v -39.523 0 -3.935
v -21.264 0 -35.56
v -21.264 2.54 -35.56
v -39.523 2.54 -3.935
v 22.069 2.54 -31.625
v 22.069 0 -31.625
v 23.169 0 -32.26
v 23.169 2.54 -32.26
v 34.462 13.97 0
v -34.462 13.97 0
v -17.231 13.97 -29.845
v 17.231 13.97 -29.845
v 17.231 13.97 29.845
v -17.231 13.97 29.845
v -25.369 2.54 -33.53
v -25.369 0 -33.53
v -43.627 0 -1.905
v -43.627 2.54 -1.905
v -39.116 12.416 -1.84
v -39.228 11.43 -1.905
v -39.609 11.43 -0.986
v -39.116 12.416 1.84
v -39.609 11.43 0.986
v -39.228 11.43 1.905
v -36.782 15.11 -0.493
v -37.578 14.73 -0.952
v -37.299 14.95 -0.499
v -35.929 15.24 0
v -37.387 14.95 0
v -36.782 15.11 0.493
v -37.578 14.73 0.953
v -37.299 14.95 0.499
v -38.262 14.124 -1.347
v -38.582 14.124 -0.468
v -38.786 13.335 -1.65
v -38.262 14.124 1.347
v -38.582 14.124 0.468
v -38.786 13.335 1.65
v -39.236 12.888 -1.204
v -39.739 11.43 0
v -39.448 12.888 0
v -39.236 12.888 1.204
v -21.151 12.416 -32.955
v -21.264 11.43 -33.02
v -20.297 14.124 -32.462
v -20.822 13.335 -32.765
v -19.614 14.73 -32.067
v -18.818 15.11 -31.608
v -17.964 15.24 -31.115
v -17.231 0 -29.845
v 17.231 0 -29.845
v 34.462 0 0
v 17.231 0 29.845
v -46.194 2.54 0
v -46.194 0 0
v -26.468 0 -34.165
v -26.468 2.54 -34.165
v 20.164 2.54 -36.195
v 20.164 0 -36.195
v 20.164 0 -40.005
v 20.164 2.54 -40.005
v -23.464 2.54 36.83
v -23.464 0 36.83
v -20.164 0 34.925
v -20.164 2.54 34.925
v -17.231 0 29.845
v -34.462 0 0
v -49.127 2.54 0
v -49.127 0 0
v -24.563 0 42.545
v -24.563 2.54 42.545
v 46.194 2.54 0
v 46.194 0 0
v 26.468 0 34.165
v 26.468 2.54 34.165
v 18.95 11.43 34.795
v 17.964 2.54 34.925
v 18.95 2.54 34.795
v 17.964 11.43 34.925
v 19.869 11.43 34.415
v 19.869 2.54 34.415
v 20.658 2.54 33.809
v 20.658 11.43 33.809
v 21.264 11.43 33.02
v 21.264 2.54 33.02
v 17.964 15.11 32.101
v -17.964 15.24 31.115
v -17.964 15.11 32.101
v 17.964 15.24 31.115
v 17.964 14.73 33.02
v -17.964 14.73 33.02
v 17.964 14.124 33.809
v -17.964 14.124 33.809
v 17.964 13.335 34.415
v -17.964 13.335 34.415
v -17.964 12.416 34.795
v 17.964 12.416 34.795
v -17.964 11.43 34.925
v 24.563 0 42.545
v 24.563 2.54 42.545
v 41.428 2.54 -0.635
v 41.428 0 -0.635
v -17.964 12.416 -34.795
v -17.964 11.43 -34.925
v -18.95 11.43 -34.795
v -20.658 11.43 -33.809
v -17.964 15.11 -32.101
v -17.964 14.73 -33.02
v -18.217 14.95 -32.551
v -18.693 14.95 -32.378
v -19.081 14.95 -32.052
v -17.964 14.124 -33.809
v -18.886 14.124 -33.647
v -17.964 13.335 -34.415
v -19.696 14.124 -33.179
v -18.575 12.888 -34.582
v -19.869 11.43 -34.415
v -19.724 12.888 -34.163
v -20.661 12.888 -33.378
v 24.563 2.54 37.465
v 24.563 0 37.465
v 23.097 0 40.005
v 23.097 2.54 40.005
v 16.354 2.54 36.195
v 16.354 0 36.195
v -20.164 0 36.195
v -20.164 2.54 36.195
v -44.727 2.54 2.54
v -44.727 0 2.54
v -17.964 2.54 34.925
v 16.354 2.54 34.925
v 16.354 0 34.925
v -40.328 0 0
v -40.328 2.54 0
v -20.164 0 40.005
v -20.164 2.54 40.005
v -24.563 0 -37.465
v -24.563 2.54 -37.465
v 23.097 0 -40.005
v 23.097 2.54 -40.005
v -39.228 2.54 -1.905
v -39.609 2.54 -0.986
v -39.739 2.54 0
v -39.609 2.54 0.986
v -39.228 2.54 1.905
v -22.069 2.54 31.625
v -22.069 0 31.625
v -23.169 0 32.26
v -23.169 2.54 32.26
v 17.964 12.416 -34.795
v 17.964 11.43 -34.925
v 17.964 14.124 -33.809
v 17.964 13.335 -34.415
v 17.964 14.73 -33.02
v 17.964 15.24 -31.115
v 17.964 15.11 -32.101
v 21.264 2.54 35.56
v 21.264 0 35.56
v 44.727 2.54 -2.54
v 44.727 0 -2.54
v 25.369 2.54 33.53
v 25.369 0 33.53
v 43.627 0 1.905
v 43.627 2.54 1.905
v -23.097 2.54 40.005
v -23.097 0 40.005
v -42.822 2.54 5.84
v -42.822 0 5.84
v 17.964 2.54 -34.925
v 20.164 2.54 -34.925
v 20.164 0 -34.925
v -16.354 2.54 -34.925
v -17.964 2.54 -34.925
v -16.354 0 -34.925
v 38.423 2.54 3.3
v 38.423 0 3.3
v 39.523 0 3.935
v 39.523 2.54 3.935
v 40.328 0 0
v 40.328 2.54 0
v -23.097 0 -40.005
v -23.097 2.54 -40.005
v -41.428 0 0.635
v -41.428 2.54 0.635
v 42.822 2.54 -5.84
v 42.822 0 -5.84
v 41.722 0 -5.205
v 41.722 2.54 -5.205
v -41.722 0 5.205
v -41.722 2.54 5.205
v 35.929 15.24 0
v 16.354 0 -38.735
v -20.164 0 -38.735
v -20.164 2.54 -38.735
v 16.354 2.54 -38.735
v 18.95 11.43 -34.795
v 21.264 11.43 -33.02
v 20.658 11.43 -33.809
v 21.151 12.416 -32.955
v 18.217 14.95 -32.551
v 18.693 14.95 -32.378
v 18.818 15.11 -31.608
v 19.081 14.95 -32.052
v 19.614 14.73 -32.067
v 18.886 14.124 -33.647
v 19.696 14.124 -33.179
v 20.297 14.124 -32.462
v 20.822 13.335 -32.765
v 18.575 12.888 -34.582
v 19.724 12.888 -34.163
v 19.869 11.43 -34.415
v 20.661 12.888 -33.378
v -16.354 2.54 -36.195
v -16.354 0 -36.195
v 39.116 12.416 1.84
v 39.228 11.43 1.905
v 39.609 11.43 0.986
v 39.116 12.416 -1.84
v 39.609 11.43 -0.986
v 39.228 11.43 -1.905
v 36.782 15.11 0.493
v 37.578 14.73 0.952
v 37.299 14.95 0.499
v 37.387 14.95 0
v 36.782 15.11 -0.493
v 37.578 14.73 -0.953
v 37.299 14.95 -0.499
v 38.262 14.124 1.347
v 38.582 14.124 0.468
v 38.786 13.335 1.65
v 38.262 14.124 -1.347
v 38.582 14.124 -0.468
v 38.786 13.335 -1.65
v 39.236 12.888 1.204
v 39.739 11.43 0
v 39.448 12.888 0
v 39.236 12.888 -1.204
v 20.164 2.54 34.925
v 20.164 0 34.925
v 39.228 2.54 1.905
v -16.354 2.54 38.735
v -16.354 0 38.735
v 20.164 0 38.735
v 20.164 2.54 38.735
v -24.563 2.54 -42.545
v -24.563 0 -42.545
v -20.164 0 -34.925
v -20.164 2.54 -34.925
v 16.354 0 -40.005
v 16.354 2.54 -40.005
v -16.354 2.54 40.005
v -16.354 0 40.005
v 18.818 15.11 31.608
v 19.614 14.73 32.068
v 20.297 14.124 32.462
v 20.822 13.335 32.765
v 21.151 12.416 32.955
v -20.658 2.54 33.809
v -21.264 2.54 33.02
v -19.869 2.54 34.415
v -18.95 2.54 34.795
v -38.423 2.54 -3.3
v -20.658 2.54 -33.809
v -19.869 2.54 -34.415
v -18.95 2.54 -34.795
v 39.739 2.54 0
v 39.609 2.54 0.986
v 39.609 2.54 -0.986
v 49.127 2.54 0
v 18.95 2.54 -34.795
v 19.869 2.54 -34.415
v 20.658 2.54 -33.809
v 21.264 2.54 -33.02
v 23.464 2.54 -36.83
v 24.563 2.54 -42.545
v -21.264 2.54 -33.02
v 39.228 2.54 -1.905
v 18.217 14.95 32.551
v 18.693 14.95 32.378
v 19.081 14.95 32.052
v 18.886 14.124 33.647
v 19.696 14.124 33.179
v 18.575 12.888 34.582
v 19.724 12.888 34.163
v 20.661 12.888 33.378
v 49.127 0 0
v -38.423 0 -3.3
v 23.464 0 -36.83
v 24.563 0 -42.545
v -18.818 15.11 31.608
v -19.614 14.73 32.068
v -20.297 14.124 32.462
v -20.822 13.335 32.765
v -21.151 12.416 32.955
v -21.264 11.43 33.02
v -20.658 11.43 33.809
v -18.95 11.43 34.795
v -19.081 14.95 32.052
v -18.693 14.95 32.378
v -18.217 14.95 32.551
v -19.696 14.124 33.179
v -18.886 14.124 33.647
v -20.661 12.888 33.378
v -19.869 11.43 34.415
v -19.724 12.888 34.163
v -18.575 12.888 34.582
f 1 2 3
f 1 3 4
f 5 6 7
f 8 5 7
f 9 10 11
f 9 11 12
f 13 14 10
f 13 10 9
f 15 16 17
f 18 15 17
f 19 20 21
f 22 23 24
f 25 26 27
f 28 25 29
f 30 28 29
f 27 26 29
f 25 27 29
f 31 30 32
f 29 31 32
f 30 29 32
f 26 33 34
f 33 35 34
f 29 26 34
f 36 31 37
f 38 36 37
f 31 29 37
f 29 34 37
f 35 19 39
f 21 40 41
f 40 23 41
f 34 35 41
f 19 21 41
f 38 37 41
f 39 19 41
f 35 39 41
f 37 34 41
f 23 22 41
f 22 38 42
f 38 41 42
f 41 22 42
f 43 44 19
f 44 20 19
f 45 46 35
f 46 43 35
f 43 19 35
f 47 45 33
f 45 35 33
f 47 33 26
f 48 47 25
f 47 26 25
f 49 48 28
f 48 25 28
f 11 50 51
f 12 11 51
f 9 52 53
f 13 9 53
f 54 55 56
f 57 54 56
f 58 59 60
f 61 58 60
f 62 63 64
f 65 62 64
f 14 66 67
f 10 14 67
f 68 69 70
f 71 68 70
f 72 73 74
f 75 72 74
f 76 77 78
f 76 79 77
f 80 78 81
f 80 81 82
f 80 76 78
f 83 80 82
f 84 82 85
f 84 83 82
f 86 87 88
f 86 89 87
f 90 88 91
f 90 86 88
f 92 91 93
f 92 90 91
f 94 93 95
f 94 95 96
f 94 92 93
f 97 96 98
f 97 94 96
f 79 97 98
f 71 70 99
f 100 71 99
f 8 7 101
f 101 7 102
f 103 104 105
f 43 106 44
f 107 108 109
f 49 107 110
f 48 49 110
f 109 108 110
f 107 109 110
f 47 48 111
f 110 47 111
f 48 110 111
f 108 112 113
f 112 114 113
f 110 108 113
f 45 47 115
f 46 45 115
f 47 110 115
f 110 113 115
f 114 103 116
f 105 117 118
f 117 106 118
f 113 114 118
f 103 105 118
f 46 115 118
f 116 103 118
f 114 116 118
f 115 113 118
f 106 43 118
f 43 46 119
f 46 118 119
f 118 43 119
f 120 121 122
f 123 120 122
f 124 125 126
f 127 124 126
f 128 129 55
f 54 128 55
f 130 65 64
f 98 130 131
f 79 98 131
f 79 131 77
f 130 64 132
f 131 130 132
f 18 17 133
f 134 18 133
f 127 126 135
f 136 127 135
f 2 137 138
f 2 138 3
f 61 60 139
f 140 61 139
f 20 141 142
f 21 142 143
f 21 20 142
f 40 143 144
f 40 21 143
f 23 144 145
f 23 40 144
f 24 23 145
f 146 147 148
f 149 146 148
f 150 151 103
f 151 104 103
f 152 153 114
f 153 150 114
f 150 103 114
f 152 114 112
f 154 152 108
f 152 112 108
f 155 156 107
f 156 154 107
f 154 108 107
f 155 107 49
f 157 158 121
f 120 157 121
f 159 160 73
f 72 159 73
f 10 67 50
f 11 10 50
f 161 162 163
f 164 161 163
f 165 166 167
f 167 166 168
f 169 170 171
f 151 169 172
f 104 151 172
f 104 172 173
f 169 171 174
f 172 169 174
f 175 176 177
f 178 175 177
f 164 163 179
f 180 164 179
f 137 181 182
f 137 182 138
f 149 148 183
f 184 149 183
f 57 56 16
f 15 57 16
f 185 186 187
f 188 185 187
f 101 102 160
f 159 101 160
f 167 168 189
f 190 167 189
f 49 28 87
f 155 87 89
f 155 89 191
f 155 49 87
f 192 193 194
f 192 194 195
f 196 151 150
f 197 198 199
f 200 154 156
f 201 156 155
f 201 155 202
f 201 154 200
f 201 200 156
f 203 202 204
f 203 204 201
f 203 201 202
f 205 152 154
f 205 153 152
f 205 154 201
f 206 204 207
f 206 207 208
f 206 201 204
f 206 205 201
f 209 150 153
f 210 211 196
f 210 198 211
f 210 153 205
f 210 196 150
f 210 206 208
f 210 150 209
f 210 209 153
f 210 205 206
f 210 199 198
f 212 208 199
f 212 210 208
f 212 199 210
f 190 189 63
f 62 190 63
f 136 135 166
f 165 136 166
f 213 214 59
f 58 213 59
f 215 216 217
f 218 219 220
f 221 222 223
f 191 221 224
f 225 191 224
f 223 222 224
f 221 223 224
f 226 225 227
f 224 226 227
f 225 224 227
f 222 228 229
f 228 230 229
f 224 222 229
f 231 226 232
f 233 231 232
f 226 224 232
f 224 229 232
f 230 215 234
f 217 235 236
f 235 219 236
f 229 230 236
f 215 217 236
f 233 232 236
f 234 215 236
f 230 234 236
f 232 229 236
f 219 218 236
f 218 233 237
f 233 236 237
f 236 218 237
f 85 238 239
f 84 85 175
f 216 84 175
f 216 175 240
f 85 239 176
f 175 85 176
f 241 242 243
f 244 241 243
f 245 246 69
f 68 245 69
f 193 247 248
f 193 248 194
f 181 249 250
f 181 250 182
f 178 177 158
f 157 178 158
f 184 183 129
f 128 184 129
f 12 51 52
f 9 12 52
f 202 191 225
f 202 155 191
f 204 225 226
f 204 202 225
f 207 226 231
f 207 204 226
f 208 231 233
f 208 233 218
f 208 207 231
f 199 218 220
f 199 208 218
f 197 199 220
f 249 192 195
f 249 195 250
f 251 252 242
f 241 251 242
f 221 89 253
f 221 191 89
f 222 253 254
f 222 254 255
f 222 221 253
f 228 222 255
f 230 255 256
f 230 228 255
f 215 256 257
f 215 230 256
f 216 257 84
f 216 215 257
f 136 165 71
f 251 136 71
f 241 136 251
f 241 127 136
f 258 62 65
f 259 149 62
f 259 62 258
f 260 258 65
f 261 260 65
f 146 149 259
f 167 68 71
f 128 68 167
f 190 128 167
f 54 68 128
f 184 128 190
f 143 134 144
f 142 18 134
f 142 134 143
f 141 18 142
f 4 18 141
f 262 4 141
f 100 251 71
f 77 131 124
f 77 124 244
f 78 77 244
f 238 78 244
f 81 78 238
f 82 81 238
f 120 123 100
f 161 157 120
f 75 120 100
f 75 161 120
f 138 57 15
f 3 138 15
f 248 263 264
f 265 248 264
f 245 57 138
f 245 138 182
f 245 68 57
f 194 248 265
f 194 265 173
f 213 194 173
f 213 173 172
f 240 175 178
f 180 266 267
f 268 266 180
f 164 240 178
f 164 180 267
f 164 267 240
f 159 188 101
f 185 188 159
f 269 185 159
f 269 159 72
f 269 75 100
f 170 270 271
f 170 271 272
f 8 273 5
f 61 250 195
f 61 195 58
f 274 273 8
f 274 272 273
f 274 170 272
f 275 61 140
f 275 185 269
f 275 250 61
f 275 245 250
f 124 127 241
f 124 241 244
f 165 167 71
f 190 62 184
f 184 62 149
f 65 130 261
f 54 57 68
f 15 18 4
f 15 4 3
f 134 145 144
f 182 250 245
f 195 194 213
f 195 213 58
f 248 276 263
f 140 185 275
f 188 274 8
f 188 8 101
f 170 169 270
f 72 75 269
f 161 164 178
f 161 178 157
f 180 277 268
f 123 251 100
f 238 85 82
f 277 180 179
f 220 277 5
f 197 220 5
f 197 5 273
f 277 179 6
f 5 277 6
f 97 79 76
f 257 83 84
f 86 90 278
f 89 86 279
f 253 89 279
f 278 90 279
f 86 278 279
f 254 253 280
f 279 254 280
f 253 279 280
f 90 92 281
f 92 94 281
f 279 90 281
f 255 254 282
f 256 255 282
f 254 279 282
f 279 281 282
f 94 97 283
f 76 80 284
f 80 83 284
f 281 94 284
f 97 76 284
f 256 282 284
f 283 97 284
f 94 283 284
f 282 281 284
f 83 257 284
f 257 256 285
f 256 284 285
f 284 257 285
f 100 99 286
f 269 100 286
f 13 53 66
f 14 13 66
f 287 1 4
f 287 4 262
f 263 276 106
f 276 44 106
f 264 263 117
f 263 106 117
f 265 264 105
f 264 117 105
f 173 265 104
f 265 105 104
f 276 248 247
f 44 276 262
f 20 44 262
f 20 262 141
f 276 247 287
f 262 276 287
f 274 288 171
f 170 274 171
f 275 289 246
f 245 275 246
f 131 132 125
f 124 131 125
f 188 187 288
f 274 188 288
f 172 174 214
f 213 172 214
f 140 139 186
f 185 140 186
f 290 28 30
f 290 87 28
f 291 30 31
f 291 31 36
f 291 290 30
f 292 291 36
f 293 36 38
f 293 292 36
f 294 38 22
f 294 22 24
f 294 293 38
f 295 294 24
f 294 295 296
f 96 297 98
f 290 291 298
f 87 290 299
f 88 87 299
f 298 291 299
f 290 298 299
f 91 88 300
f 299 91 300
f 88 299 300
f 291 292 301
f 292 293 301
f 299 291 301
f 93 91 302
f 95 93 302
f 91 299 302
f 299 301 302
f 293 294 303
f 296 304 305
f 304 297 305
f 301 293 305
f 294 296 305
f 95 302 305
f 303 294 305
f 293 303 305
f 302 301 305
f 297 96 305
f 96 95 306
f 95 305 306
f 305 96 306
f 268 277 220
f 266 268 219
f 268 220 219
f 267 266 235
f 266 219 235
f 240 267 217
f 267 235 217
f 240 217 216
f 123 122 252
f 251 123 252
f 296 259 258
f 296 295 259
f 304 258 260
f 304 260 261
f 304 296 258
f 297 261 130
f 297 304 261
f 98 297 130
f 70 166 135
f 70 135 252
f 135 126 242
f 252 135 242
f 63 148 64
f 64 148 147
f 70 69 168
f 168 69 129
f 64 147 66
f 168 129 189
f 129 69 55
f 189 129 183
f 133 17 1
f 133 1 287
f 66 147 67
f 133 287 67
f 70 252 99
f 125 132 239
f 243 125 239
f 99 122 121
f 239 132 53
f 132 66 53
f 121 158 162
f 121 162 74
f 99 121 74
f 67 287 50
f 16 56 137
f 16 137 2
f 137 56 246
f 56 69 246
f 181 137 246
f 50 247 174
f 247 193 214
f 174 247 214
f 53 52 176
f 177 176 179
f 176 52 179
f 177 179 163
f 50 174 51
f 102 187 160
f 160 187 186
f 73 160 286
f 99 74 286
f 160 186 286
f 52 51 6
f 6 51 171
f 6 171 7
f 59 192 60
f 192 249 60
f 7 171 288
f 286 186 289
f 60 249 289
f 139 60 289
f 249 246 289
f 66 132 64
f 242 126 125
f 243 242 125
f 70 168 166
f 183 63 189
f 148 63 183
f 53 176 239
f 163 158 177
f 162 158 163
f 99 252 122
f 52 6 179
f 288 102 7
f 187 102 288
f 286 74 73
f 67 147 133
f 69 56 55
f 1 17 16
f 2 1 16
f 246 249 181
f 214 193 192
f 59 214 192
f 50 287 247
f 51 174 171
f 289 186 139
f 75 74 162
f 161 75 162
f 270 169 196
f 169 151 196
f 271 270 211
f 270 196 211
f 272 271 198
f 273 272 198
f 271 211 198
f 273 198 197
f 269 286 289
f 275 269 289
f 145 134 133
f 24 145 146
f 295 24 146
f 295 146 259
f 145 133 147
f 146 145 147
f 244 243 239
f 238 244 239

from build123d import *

# Parameters (mm, degrees)
BOSS_EXTRUDE2_DEPTH = 2.54
BOSS_EXTRUDE3_DEPTH = 12.7
CUT_EXTRUDE1_DEPTH  = 13.97
FILLET1_R           = 3.8099999999999996


with BuildPart() as part:
    # Sketch1 → Boss-Extrude2 (new body)
    with BuildSketch(Plane(origin=(0, 0, 0), x_dir=(1, 0, 0), z_dir=(0, 1, 0))):
        Polygon((49.12673440534523, 7.27e-15), (24.56336720267261, 42.545), (-24.56336720267263, 42.544999999999995), (-49.12673440534525, -4.56e-15), (-24.56336720267264, -42.545), (24.56336720267261, -42.545), align=None)
        Polygon((-23.09689751893098, 40.004999999999995), (-24.56336720267272, 37.465000000000906), (-21.263810414254024, 35.560000000000905), (-39.522768565701696, 3.9345567884195773), (-38.42291630289545, 3.299556788419578), (-20.163958151447684, 34.925), (-20.163958151447687, 38.735), (16.353958151447667, 38.735), (16.353958151447667, 40.004999999999995), align=None, mode=Mode.SUBTRACT)
        Polygon((20.1639581514492, -34.92499999999734), (38.42291630289649, -3.299556788416705), (39.52276856570363, -3.934556788417227), (21.263810414255218, -35.55999999999977), (24.56336720267305, -37.464999999999264), (23.096897518930962, -40.004999999999995), (-16.353958151447596, -40.0049999999992), (-16.353958151447596, -38.7350000000008), (20.1639581514492, -38.7350000000008), align=None, mode=Mode.SUBTRACT)
        Polygon((40.32791630289463, 1.40742e-12), (22.06895815144691, 31.625443211581366), (23.168810414254217, 32.26044321158198), (41.42776856570169, 0.6350000000010452), (44.727325354119536, 2.540000000000058), (46.19379503786194, 0), (26.468367202673054, -34.16544321158055), (25.368514939866817, -33.53044321158055), (43.62747309131447, -1.9049999999993157), align=None, mode=Mode.SUBTRACT)
        Polygon((20.16395815144767, 34.925), (-16.35395815144768, 34.925), (-16.35395815144768, 36.195), (20.16395815144767, 36.195), (20.163958151447673, 40.004999999999995), (23.096897518930962, 40.004999999999995), (42.82232535411953, 5.839556788418761), (41.7224730913133, 5.204556788418767), (23.4635149398656, 36.83000000000007), align=None, mode=Mode.SUBTRACT)
        Polygon((-40.32791630289535, 3.53e-15), (-22.068958151447685, -31.6254432115805), (-23.168810414253926, -32.26044321158051), (-41.427768565701626, -0.634999999999201), (-44.72732535412034, -2.5399999999991967), (-46.19379503786196, -8.7e-16), (-26.468367202672724, 34.16544321158219), (-25.368514939866504, 33.530443211582195), (-43.62747309131417, 1.9050000000008698), align=None, mode=Mode.SUBTRACT)
        Polygon((-20.163958151444543, -34.92499999999999), (16.35395815144779, -34.924999999999194), (16.353958151447785, -36.19500000000081), (-20.1639581514476, -36.19500000000081), (-20.1639581514476, -40.00499999999919), (-23.09689751893098, -40.004999999999995), (-42.82232535412034, -5.839556788417916), (-41.72247309131411, -5.204556788417918), (-23.46351493986529, -36.83000000000117), align=None, mode=Mode.SUBTRACT)
    extrude(amount=BOSS_EXTRUDE2_DEPTH)

    # Sketch2 → Boss-Extrude3 (add)
    with BuildSketch(Plane(origin=(0, 2.54, 0), x_dir=(1, 0, 0), z_dir=(0, 1, 0))):
        Polygon((-20.163958151447684, 34.925), (-40.32791630289537, -2.429e-14), (-20.163958151447673, -34.92500000000001), (20.163958151447694, -34.92500000000001), (40.32791630289537, 2.74e-15), (20.163958151447677, 34.925), align=None)
    extrude(amount=BOSS_EXTRUDE3_DEPTH)

    # Sketch3 → Cut-Extrude1 (cut)
    with BuildSketch(Plane.XZ):
        Polygon((17.23101878396438, -29.844999999999995), (34.46203756792874, 9.8e-15), (17.231018783964352, 29.845000000000006), (-17.231018783964387, 29.845000000000002), (-34.46203756792876, -6.96e-15), (-17.231018783964384, -29.84499999999999), align=None)
    extrude(amount=-CUT_EXTRUDE1_DEPTH, mode=Mode.SUBTRACT)

    # Fillet1
    fillet1_edges = [part.edges().sort_by_distance(p)[0] for p in [
        (20.163958151447677, 8.89, -34.925),
        (-20.163958151447684, 8.89, -34.925),
        (-40.32791630289537, 8.89, 2.429e-14),
        (-20.163958151447673, 8.89, 34.92500000000001),
        (20.163958151447694, 8.89, 34.92500000000001),
        (40.32791630289537, 8.89, -2.74e-15),
        (-3.55e-15, 15.239999999999998, -34.925),
        (-30.245937227171524, 15.239999999999998, -17.462499999999988),
        (-30.24593722717152, 15.239999999999998, 17.46250000000002),
        (1.066e-14, 15.239999999999998, 34.92500000000001),
        (30.24593722717153, 15.239999999999998, 17.462500000000006),
        (30.245937227171524, 15.239999999999998, -17.462500000000002),
    ]]
    fillet(fillet1_edges, radius=FILLET1_R)


solid = part.part
